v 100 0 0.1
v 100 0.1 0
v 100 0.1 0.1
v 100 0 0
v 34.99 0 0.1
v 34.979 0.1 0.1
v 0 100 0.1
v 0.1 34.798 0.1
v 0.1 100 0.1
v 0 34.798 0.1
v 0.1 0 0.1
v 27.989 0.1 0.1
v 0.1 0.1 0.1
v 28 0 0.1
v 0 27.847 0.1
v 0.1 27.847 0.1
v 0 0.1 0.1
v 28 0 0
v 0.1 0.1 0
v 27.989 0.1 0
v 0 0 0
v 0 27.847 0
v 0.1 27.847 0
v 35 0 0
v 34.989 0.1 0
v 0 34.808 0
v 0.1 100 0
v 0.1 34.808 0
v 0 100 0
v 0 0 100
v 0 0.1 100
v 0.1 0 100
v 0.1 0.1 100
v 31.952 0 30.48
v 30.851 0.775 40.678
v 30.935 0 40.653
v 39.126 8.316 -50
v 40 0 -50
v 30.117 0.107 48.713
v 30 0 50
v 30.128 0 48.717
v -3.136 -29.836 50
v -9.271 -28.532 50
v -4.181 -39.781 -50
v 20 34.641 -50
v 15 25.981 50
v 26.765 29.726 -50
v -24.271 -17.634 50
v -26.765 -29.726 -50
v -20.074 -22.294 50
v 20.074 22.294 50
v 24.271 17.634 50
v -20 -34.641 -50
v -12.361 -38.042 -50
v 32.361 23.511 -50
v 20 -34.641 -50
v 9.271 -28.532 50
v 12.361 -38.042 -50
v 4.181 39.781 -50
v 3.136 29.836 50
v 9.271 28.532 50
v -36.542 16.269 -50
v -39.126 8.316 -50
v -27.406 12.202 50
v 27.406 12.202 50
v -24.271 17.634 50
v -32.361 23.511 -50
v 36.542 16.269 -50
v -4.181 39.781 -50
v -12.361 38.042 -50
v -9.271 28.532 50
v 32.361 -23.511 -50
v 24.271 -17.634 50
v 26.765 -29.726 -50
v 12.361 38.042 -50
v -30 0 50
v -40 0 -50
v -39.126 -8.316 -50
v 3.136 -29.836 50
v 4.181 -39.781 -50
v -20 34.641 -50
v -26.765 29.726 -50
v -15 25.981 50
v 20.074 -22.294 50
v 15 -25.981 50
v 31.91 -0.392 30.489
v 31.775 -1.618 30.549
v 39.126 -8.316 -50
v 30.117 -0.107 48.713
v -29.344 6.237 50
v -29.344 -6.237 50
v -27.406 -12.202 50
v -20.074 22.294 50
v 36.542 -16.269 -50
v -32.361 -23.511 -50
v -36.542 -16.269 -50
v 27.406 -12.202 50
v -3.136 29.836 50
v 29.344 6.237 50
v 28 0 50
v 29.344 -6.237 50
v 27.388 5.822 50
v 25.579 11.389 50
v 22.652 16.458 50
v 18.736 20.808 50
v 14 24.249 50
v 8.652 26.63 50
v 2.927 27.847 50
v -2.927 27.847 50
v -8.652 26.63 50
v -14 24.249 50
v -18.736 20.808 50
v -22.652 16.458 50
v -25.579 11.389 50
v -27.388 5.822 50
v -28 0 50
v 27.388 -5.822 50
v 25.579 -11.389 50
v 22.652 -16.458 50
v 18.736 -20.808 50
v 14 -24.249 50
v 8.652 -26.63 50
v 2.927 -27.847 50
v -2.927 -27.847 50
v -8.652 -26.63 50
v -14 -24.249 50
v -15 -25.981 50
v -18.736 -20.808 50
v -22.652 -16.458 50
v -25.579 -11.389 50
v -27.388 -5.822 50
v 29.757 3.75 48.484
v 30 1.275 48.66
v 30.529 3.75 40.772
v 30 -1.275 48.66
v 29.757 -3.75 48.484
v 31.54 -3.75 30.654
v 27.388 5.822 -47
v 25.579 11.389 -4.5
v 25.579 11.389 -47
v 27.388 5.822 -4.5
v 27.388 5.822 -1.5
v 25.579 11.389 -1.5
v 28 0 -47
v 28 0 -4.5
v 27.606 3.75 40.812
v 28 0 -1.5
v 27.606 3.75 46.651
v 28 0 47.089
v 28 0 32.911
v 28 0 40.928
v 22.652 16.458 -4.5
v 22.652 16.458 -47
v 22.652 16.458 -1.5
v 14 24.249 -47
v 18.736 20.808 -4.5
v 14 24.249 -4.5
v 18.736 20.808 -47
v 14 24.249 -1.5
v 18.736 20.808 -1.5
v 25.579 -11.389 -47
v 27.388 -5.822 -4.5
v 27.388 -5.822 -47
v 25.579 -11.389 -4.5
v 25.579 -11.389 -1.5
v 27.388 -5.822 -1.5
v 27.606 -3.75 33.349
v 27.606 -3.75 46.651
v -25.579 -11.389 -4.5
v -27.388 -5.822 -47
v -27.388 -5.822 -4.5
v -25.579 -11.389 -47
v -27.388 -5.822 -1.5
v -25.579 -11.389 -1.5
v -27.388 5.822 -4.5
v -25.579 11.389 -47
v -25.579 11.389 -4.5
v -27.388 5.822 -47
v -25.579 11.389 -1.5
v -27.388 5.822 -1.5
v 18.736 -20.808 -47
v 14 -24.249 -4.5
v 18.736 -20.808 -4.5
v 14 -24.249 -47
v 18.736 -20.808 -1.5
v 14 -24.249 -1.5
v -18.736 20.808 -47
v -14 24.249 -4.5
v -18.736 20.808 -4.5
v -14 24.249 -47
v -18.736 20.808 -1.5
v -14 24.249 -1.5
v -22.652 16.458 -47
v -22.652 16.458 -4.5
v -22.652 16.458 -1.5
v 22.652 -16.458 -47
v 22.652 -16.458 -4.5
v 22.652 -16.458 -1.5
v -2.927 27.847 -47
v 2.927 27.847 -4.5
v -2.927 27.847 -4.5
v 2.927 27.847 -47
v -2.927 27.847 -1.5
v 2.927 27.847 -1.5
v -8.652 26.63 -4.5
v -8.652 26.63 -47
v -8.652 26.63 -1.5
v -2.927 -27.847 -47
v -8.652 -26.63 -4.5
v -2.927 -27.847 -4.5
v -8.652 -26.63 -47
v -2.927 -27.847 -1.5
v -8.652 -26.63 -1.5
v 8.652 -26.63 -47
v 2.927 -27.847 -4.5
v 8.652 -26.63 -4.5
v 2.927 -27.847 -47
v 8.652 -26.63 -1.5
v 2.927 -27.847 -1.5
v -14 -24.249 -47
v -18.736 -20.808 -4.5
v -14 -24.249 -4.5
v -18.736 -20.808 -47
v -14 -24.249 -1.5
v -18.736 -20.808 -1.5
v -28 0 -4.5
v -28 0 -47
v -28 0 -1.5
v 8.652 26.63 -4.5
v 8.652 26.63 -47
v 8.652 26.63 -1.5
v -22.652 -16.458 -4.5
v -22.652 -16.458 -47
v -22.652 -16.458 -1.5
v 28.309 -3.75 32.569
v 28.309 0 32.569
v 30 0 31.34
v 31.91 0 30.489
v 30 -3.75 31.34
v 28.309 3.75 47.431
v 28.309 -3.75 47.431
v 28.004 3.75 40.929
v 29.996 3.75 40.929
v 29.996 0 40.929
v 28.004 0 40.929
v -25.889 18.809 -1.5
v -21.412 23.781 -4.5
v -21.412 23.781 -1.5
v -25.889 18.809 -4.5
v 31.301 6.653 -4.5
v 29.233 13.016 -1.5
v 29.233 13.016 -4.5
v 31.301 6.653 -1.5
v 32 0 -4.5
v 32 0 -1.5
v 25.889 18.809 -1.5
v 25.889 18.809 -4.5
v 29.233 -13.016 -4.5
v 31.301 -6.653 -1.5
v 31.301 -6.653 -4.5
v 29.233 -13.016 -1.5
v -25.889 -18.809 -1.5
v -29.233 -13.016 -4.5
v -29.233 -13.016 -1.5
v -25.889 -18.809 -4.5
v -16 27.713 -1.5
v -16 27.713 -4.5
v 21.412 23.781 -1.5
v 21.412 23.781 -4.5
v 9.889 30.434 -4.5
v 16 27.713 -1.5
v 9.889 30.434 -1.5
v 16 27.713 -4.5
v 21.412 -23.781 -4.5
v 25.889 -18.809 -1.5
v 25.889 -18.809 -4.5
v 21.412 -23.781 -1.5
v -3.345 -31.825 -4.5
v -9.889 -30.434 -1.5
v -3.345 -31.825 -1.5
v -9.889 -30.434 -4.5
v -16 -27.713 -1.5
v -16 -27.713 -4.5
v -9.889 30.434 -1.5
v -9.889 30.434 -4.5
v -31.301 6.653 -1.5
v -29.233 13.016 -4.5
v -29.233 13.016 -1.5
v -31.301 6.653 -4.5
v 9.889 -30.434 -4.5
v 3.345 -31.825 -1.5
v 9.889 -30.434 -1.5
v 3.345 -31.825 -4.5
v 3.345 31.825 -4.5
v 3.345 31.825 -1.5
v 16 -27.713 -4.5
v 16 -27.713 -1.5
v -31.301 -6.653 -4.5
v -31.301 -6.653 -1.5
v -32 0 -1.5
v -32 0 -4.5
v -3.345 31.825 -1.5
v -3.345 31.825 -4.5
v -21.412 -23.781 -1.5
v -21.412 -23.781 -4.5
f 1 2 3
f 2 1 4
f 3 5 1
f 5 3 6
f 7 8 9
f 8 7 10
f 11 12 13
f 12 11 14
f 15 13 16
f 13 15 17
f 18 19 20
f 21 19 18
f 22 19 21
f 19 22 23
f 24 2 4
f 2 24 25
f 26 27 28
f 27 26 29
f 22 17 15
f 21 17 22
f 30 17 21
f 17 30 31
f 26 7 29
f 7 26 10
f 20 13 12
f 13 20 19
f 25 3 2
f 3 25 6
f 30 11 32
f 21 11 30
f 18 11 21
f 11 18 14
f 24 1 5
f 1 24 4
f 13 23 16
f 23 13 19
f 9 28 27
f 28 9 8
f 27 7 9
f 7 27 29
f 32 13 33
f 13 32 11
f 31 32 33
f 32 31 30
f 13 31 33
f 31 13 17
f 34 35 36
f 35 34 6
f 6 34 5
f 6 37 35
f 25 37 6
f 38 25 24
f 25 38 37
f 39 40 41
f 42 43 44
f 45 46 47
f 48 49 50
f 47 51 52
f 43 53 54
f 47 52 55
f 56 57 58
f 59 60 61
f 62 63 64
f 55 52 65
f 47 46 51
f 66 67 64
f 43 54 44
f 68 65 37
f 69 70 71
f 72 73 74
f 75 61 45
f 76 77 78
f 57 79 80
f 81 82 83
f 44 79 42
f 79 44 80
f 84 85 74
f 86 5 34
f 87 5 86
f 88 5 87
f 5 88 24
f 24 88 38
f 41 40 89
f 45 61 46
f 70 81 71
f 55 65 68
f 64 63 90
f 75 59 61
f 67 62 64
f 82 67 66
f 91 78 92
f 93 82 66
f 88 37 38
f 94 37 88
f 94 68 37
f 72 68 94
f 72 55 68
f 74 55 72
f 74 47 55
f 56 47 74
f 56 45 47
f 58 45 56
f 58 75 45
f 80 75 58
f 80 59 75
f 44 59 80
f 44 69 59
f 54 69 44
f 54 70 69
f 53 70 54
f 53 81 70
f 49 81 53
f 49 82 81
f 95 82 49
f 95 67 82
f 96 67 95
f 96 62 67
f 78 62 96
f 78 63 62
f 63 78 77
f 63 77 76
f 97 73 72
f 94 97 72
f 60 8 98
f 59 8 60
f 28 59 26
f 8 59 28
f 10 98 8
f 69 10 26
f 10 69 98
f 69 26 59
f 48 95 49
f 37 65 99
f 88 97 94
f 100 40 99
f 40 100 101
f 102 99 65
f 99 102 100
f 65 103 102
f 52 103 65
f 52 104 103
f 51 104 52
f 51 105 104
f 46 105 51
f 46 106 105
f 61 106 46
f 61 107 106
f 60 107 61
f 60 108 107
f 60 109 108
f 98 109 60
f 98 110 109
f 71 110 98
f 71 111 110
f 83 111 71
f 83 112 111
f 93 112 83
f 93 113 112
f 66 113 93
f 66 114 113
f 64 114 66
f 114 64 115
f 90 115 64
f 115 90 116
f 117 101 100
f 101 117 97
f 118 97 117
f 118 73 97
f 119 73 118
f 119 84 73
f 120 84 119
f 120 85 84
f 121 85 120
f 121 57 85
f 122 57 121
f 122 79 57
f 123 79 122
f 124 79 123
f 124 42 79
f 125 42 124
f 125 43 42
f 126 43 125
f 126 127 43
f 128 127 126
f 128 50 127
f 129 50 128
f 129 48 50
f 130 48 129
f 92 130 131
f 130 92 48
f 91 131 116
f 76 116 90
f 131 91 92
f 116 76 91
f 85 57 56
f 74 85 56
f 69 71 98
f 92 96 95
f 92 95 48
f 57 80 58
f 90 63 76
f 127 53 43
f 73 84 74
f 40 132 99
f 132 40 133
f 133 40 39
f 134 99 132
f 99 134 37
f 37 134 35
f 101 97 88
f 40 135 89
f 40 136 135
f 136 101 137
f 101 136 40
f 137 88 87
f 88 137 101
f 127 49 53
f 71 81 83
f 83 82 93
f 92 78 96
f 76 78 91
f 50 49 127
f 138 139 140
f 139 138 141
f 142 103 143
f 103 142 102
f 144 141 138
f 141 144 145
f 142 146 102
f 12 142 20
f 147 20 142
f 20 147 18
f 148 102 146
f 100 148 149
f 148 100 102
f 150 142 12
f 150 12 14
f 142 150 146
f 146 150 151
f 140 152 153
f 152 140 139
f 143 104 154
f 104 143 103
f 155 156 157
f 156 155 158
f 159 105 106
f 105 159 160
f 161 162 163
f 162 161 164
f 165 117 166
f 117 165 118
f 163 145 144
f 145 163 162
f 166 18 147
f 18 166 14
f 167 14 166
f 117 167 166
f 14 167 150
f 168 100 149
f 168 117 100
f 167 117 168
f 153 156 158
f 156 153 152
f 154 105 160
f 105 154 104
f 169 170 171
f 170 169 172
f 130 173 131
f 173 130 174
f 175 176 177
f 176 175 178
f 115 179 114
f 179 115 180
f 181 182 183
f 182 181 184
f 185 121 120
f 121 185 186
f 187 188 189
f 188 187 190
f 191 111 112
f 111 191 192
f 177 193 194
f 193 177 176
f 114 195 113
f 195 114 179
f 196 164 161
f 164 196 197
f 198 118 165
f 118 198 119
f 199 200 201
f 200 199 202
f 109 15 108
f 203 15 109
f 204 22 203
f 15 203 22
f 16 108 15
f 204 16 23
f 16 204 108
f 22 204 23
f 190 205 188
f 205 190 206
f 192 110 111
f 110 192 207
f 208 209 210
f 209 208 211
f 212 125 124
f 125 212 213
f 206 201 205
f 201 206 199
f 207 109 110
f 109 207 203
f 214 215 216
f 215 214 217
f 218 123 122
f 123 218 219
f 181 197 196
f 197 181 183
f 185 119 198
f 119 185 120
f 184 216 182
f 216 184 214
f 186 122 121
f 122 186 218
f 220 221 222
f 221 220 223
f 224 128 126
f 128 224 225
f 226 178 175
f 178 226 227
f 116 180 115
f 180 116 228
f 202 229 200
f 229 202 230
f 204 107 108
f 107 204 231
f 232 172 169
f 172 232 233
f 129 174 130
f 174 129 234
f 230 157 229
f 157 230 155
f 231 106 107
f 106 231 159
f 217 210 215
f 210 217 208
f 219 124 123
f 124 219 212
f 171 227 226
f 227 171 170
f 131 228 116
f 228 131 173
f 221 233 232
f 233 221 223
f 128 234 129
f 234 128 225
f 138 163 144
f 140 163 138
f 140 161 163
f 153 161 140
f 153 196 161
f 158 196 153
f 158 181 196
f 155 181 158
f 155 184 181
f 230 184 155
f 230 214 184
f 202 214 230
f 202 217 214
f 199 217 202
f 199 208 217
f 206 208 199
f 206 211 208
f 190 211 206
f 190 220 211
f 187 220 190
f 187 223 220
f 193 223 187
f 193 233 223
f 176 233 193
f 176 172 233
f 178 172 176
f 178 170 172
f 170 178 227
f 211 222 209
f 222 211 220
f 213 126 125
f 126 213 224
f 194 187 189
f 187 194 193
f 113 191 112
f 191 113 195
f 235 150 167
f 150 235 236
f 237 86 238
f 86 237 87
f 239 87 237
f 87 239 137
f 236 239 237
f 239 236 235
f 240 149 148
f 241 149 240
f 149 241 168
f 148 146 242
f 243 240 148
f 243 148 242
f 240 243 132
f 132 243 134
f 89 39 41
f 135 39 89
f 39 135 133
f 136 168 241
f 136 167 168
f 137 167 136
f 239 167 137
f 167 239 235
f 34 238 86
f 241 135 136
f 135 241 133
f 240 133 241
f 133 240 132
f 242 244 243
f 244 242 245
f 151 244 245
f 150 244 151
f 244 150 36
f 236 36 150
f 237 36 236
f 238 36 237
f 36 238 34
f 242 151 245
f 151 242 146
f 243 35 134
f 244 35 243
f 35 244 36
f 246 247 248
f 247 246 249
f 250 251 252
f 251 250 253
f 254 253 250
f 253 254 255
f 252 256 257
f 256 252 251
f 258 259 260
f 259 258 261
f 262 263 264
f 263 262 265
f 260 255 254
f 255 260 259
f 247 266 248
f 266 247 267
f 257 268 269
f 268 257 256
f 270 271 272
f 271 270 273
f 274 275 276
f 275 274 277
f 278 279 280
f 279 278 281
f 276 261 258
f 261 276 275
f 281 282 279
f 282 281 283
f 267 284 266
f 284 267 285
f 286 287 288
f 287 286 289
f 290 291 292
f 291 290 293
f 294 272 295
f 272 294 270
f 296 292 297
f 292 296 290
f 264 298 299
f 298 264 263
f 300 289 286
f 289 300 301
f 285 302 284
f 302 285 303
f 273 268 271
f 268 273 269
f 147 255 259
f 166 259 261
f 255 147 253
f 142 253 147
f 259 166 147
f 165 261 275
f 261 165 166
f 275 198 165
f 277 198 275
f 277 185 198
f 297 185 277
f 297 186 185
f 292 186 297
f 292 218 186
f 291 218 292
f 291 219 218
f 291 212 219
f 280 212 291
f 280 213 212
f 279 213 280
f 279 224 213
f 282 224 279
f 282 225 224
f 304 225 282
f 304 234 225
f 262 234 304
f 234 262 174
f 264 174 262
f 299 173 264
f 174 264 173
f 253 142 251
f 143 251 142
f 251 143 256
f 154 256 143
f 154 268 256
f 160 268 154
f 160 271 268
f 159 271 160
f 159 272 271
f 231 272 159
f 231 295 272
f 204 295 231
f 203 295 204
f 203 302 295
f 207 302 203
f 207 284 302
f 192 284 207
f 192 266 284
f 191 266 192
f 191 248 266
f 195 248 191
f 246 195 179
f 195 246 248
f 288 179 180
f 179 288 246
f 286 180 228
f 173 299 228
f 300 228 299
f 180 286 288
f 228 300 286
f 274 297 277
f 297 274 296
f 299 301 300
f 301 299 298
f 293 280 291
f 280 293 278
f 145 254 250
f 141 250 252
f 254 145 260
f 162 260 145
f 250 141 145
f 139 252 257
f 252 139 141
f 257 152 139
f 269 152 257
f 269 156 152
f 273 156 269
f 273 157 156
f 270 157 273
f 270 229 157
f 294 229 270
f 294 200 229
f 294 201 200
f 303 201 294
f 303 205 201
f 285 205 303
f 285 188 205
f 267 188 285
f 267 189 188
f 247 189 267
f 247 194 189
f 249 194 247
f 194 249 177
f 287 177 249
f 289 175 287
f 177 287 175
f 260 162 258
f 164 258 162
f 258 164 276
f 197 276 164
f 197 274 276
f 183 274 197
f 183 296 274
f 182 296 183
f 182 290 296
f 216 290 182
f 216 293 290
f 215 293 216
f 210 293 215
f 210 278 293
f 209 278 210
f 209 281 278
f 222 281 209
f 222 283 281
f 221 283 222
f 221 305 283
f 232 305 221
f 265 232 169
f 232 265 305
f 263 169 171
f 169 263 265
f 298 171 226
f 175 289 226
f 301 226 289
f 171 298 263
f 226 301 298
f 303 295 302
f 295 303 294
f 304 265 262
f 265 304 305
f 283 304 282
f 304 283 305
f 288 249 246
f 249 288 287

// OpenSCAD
    // Combined Scene

    // Permanent Model
    
    // Permanent Model (Black)
    color([0, 0, 0]) {
        // Your permanent model code here
        cube([100,0.1,0.1], center = false);
        cube([0.1,100,0.1], center = false);
        cube([0.1,0.1,100], center = false);
    }
    

    // Dynamic Model
    difference() {
    // Outer mug body with a wider top and tapered bottom for aesthetics
    difference() {
        // Outer shape with a flared rim, wider at the top
        cylinder(h=100, r1=40, r2=30, center=true);
        // Inner hollow space for fluid containment with uniform wall thickness
        translate([0, 0, 2])
            cylinder(h=98, r=28, center=true);
    }

    // Handle of the mug
    translate([35, 0, 40])
        rotate([90, 0, 0])
            difference() {
                // Outer part of handle
                scale([1, 1, 0.5])
                    cylinder(h=15, r=10, center=true);
                
                // Inner cutout of handle
                translate([-6, -6, -5])
                    scale([1, 1, 0.5])
                        cylinder(h=20, r=7, center=true);
            }

    // Rounded base for stability
    translate([0, 0, -3])
        cylinder(h=3, r=32, center=true);

    // Fillet the top rim for comfort
    translate([0, 0, 100])
        cylinder(h=4, r=40, center=true);
    translate([0, 0, 100])
        cylinder(h=4, r=30, center=true);
}
    
